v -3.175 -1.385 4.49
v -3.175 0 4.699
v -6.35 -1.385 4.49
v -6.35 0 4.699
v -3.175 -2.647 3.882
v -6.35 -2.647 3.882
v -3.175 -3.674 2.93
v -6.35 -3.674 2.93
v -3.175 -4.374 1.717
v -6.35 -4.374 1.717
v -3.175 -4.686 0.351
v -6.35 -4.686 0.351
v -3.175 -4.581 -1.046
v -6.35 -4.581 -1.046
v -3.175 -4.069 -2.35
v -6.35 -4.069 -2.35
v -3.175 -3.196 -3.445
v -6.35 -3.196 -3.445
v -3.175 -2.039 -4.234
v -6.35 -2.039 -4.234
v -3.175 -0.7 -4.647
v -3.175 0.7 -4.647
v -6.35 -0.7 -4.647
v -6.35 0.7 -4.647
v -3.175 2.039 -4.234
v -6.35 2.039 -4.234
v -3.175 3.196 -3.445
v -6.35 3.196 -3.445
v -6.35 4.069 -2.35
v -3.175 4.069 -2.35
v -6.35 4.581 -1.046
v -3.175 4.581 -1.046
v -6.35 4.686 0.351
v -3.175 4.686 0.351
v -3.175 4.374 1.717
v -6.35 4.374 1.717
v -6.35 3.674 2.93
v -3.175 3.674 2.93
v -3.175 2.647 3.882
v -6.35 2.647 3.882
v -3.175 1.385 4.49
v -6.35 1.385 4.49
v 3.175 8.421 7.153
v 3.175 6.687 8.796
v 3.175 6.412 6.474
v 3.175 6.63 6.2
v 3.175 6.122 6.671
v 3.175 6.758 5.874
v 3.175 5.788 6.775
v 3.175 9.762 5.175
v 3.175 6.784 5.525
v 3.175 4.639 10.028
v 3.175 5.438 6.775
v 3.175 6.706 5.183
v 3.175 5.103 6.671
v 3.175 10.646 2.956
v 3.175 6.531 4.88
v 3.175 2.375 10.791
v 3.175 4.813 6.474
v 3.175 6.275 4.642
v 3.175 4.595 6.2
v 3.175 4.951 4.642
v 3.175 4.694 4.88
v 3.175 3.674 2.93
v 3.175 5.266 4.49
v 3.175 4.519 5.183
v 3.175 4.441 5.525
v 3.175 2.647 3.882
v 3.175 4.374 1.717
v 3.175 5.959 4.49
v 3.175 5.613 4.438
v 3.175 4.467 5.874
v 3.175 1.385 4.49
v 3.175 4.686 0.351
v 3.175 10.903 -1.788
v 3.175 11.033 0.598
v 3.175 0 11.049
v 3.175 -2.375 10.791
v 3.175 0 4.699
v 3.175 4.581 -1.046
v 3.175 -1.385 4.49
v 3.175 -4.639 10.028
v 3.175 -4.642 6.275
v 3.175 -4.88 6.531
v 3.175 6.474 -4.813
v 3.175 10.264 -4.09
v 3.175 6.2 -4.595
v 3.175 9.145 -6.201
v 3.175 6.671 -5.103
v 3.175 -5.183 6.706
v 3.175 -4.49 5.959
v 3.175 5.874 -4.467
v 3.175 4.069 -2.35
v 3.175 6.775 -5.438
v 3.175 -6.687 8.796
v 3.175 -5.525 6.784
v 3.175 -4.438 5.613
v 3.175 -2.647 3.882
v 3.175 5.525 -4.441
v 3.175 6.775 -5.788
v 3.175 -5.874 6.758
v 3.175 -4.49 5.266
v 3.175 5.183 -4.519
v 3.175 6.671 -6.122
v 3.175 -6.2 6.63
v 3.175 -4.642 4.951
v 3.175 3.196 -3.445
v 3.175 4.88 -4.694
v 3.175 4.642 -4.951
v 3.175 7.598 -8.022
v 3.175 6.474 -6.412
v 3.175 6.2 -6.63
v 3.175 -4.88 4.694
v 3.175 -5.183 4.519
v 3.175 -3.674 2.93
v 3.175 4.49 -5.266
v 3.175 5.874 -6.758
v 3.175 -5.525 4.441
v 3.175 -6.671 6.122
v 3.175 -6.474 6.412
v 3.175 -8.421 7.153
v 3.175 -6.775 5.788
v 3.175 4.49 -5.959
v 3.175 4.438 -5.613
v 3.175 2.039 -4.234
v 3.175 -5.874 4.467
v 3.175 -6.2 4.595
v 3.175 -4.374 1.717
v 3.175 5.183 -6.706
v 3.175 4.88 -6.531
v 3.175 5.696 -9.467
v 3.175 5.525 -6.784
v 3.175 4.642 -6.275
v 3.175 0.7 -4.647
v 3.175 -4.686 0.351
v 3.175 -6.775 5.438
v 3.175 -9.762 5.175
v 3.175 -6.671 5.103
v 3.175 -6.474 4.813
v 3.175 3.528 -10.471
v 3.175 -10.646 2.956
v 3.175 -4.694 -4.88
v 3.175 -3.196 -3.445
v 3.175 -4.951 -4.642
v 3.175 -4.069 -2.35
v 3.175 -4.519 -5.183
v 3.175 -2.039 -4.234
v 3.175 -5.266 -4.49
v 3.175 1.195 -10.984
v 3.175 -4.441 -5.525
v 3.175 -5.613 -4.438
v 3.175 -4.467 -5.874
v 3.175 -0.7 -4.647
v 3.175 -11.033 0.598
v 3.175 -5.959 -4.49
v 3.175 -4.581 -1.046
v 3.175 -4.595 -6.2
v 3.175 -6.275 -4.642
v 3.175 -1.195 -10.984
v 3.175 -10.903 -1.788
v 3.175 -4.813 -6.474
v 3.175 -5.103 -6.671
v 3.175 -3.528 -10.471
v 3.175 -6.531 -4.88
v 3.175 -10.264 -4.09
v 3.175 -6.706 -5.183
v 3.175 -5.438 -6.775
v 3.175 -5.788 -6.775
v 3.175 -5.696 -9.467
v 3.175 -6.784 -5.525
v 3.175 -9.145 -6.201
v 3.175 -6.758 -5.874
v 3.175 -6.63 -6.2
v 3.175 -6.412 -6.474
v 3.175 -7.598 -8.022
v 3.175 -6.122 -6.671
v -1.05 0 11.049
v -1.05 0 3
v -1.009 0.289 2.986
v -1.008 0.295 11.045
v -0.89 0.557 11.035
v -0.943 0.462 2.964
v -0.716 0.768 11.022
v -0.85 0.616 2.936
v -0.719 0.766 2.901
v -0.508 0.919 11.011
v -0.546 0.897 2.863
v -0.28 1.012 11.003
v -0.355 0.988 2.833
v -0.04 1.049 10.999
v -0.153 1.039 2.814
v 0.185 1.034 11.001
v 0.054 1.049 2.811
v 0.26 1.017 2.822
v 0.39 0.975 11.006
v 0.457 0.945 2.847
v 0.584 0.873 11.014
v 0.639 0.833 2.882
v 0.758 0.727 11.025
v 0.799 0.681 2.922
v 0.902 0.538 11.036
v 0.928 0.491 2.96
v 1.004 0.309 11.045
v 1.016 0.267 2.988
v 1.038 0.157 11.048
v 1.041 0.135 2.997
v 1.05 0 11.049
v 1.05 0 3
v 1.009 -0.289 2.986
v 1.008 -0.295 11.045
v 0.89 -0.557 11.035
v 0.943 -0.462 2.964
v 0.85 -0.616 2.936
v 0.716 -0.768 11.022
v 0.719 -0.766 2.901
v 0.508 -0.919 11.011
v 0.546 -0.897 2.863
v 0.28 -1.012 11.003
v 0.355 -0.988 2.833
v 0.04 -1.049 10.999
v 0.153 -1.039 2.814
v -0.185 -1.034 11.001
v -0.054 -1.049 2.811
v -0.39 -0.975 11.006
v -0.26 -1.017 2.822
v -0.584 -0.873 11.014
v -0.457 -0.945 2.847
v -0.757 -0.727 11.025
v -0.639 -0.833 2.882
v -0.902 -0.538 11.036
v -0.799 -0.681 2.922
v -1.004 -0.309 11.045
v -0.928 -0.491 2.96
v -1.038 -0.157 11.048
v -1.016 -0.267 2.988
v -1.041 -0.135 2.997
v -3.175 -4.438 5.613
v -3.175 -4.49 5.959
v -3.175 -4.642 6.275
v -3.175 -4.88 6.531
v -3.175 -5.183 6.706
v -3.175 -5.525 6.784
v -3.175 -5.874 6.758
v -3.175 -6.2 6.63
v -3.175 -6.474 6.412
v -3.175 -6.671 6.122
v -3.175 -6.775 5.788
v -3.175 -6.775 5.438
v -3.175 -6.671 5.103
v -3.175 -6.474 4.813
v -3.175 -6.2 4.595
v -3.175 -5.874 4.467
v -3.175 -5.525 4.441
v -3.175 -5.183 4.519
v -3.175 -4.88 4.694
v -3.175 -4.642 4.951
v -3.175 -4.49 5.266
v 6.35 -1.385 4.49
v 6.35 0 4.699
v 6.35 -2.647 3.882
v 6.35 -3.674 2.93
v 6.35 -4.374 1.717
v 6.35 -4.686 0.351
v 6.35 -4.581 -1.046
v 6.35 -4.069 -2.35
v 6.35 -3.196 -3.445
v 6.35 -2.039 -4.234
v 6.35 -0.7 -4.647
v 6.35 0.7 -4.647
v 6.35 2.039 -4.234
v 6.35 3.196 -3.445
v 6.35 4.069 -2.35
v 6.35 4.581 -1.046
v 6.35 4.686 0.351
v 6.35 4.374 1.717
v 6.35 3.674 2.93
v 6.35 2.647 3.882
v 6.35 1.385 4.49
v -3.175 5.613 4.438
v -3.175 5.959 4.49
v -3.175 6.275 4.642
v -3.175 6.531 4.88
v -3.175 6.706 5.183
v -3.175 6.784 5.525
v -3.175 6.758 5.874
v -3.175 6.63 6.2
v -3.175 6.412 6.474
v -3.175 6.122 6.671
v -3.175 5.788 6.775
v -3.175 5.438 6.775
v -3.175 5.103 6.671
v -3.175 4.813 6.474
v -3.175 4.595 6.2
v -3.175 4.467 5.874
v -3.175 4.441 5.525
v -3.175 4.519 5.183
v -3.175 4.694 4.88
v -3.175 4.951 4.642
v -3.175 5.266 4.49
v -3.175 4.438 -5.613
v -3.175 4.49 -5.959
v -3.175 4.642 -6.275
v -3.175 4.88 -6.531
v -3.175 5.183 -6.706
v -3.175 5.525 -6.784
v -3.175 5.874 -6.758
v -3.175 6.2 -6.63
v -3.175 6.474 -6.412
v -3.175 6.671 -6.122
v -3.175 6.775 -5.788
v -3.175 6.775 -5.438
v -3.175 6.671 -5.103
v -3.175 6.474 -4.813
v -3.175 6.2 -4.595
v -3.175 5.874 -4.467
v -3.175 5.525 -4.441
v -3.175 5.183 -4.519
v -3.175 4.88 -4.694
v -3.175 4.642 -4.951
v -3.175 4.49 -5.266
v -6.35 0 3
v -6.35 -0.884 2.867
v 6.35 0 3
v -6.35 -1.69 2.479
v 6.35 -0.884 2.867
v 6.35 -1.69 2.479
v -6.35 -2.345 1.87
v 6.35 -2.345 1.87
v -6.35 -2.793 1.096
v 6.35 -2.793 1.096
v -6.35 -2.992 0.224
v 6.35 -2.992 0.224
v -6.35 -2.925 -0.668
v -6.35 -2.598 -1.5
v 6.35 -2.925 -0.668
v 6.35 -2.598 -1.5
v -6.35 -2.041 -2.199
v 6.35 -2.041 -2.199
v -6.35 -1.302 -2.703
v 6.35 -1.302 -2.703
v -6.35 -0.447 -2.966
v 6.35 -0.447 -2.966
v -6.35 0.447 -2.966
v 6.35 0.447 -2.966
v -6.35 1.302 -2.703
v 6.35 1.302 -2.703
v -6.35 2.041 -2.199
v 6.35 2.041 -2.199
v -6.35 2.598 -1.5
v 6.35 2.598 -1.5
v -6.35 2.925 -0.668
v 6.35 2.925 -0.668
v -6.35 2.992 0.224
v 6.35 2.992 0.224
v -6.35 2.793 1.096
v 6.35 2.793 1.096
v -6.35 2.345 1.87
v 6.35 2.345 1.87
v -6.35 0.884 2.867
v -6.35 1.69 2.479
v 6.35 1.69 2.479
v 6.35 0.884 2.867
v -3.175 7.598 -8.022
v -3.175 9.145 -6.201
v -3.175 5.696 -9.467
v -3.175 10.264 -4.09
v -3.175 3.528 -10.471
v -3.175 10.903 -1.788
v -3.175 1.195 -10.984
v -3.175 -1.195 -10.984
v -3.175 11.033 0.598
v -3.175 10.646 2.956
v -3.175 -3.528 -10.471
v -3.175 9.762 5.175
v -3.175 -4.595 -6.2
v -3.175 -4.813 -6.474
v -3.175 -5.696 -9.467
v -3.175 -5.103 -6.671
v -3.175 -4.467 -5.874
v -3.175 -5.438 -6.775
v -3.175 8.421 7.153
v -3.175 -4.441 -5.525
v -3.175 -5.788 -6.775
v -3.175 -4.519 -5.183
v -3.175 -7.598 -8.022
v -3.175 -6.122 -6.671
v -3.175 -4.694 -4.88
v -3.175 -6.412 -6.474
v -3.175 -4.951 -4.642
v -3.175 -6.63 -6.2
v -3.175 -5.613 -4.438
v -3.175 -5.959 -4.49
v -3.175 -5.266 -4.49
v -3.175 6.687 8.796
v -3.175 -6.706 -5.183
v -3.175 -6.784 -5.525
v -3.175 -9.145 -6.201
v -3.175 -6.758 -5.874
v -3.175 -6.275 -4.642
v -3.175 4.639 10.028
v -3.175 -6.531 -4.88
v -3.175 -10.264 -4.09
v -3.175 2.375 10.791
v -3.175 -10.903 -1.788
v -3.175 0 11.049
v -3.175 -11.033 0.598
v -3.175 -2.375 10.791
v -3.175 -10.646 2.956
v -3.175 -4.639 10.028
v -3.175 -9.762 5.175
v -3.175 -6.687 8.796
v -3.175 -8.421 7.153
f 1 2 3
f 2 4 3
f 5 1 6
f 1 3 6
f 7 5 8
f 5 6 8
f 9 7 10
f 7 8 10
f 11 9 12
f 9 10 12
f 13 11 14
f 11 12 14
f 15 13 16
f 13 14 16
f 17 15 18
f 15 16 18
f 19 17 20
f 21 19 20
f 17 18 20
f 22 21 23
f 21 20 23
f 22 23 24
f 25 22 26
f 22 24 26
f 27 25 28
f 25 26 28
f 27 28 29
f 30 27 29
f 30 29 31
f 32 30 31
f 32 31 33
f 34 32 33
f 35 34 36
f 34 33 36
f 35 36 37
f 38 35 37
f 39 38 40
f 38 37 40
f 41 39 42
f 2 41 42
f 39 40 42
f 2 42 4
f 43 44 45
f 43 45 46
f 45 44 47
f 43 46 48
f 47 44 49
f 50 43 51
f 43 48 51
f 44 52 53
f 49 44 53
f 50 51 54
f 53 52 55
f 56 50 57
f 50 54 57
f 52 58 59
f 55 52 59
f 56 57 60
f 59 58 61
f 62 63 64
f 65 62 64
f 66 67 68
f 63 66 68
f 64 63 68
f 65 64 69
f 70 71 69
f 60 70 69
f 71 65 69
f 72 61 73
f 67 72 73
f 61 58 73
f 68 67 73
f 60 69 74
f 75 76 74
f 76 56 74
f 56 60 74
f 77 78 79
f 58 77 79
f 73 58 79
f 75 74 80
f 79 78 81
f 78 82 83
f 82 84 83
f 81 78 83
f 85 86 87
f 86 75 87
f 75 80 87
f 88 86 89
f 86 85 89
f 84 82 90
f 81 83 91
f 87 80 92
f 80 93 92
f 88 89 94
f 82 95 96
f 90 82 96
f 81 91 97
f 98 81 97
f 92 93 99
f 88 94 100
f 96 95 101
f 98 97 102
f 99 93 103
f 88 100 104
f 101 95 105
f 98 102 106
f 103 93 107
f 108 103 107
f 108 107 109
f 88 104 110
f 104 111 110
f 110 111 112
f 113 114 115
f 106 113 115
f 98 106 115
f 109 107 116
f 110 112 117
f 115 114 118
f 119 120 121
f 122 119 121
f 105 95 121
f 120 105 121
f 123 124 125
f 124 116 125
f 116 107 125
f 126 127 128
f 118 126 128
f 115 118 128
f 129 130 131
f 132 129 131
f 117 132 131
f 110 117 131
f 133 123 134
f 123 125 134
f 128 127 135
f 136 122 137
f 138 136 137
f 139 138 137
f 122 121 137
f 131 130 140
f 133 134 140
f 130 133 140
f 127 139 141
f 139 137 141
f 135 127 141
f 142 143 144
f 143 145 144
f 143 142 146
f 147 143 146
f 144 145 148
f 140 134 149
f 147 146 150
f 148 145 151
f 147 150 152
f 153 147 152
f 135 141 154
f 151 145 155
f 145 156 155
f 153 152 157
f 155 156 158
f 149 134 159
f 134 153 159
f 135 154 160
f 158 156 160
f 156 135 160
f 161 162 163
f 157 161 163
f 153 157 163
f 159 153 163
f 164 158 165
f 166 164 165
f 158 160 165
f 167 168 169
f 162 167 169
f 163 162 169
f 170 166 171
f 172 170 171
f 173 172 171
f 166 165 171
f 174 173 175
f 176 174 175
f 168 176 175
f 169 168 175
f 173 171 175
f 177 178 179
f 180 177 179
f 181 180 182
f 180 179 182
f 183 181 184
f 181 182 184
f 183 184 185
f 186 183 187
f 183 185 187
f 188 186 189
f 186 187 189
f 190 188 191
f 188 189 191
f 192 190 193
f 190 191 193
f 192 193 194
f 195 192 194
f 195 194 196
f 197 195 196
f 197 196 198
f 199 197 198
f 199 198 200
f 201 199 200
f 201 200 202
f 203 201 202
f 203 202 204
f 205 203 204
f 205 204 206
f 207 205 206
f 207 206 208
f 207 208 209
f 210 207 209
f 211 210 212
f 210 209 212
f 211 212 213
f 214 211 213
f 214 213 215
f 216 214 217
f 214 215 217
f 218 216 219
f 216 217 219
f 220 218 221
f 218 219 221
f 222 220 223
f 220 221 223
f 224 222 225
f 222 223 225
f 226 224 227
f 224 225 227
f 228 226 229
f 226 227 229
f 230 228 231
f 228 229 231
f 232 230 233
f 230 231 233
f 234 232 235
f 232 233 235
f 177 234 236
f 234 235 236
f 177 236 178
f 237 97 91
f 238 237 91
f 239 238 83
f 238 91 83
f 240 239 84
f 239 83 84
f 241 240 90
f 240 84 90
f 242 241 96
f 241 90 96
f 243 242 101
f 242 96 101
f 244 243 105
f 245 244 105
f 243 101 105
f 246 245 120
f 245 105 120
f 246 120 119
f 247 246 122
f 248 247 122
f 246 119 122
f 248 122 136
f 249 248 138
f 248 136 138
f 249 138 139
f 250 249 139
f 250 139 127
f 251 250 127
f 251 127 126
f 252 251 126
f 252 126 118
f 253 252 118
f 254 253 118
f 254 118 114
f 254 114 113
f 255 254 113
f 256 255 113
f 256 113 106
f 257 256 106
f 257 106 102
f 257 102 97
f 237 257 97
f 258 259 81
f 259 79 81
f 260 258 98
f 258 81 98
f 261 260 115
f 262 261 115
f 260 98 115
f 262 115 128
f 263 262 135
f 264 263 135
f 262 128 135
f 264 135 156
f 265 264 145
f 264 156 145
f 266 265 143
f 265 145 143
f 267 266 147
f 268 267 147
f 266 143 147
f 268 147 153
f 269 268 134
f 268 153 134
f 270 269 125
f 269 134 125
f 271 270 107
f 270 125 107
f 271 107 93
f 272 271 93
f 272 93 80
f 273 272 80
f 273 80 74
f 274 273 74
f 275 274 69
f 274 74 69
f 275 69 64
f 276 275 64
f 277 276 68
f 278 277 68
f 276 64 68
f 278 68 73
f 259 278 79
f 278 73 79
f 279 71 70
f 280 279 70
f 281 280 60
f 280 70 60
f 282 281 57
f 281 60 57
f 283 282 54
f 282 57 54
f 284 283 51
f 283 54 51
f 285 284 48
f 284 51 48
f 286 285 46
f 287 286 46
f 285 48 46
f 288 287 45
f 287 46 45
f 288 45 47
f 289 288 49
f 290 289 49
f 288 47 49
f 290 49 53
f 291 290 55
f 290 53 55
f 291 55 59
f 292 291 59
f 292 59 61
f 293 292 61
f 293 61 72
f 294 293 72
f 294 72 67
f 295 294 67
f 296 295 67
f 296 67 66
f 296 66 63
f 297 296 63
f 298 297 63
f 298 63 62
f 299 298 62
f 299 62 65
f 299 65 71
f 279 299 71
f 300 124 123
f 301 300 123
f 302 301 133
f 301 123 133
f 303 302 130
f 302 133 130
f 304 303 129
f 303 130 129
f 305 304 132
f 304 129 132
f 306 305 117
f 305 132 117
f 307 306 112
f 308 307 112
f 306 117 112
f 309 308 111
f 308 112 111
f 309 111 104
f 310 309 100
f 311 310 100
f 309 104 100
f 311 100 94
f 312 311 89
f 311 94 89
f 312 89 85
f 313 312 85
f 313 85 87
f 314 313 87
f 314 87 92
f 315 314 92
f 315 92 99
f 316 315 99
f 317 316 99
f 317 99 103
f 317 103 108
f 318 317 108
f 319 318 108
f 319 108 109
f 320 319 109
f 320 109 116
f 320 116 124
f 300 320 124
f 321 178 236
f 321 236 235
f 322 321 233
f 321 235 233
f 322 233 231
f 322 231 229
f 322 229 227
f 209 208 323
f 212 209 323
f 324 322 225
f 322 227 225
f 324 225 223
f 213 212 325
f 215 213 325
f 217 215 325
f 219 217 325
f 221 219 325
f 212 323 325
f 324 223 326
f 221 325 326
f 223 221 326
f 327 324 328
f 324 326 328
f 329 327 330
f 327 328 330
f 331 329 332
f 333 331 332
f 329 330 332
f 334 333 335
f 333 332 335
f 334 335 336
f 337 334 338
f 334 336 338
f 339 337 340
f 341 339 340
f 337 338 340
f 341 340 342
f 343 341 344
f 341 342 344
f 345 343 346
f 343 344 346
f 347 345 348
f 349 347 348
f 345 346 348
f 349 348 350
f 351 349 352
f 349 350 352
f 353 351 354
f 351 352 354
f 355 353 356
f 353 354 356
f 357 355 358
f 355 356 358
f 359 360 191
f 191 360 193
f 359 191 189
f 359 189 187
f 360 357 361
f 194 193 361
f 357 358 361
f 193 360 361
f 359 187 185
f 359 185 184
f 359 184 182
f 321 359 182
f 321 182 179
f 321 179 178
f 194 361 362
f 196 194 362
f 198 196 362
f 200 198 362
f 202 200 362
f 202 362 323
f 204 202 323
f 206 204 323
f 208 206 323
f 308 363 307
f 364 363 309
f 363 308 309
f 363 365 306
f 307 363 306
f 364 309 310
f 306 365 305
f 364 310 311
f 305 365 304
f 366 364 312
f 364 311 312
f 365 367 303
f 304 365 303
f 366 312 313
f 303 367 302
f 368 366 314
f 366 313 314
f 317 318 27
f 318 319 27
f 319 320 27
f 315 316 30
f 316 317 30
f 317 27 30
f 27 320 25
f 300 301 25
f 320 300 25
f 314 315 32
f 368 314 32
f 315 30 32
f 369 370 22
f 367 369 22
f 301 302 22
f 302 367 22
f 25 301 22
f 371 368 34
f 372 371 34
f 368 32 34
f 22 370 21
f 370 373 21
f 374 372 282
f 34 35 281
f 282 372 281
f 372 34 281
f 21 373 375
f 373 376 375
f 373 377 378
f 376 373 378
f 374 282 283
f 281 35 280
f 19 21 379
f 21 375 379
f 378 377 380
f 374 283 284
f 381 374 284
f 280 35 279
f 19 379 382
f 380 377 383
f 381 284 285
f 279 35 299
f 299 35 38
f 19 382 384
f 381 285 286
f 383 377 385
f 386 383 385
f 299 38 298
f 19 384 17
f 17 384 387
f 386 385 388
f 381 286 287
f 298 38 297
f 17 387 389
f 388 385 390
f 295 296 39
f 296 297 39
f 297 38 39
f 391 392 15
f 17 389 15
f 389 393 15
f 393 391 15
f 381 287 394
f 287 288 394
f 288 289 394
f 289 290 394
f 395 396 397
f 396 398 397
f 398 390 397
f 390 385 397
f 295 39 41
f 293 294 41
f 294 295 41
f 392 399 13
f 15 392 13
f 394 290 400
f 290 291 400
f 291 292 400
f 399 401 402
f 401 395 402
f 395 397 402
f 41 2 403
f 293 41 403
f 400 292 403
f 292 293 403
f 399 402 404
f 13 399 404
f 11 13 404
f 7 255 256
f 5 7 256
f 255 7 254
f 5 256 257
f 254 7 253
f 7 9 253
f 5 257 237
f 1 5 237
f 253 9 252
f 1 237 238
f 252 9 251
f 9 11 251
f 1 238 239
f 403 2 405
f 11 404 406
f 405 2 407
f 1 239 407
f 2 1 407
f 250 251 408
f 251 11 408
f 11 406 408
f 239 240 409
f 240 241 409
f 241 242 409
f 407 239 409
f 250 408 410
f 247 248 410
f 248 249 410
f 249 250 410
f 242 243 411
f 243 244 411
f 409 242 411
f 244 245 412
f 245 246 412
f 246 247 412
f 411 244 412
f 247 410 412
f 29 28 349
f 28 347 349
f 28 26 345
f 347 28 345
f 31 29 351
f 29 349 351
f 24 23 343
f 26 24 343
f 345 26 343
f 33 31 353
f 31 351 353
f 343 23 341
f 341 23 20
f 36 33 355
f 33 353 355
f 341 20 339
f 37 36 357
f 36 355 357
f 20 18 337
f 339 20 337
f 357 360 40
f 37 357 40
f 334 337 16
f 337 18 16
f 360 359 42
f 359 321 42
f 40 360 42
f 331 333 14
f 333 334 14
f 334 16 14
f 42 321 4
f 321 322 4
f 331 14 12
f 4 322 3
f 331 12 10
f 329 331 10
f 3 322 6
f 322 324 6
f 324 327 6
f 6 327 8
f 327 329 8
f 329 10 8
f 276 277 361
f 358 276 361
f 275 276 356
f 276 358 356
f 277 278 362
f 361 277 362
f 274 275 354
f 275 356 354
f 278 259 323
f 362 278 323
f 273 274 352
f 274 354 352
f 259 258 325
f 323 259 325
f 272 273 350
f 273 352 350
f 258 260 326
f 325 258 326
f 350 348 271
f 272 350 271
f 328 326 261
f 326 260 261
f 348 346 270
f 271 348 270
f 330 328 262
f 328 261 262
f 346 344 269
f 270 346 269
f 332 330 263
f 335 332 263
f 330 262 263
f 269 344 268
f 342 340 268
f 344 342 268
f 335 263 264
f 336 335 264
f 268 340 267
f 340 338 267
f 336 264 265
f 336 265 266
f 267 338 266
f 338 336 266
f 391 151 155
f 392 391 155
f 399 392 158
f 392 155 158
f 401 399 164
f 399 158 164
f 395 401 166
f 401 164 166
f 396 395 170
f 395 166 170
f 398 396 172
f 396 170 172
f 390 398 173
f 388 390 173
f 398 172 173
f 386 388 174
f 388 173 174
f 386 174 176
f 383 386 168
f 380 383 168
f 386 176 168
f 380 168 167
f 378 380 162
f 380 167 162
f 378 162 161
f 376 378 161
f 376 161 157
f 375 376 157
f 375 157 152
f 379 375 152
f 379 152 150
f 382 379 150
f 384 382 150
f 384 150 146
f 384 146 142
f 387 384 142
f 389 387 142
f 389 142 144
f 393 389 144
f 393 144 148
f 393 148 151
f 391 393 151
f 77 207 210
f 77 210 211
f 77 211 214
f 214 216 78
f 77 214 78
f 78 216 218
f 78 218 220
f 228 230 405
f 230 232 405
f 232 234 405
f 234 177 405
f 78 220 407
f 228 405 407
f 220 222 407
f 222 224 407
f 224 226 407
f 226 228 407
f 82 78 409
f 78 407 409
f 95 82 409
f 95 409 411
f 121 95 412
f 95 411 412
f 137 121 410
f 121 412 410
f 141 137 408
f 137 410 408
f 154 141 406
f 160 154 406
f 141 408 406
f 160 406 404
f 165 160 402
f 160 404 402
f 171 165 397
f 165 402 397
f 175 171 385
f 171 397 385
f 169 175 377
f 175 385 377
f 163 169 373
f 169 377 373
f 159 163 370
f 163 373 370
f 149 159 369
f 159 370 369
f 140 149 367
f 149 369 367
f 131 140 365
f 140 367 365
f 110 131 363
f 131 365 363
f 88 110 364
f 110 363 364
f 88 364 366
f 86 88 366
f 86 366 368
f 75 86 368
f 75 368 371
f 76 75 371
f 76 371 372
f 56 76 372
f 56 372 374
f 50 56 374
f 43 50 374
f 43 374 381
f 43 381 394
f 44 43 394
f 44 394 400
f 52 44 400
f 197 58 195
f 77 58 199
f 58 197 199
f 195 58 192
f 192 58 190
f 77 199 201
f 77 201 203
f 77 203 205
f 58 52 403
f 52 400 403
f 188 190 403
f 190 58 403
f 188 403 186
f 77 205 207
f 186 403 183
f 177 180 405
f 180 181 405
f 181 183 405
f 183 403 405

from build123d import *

# Parameters (mm, degrees)
F3_D            = 2.35
F3_COPIES_COUNT = 4
F7_D            = 2.1
F7_DEPTH        = 8.5
F7_START        = 0.0500046
F7_TIP          = 0.63090365


# Not quite as in the source:
# - a pattern or mirror of a feature is missing from the dataset's text; its kind, count and spacing are read off the source's solid


with BuildPart() as f1:
    # F0 (on Front) → F1 (revolve)
    with BuildSketch(Plane.XZ):
        Polygon((-6.35, 4.699), (-6.35, 3), (6.35, 3), (6.35, 4.699), (3.175, 4.699), (3.175, 11.049), (-3.175, 11.049), (-3.175, 4.699), align=None)
    revolve(axis=Axis((0, 0, 0), (1, 0, 0)))

    # F3 (through all)
    with Locations(Plane(origin=(-3.175, 0, 0), x_dir=(0, -1, 0), z_dir=(-1, 0, 0))):
        with Locations((5.6126600757, 5.6126600757)):
            f3 = Hole(F3_D / 2)

    # F3_copies: F3 ×4 about axis
    f3_copies_axis = Axis((0, 0, 0), (1, 0, 0))
    for i in range(1, F3_COPIES_COUNT):
        add(f3.rotate(f3_copies_axis, i * 360 / F3_COPIES_COUNT), mode=Mode.SUBTRACT)

    # F7
    # its depths count from where the whole tool has entered the part; down to there all is cleared
    with Locations(Plane.XY.offset(11.049).offset(-F7_START)):
        with Locations((0, 0)):
            Hole(F7_D / 2, depth=F7_DEPTH)
            with Locations((0, 0, -(F7_DEPTH + F7_TIP / 2))):  # 118° drill point
                Cone(0, F7_D / 2, F7_TIP, mode=Mode.SUBTRACT)


solid = f1.part
